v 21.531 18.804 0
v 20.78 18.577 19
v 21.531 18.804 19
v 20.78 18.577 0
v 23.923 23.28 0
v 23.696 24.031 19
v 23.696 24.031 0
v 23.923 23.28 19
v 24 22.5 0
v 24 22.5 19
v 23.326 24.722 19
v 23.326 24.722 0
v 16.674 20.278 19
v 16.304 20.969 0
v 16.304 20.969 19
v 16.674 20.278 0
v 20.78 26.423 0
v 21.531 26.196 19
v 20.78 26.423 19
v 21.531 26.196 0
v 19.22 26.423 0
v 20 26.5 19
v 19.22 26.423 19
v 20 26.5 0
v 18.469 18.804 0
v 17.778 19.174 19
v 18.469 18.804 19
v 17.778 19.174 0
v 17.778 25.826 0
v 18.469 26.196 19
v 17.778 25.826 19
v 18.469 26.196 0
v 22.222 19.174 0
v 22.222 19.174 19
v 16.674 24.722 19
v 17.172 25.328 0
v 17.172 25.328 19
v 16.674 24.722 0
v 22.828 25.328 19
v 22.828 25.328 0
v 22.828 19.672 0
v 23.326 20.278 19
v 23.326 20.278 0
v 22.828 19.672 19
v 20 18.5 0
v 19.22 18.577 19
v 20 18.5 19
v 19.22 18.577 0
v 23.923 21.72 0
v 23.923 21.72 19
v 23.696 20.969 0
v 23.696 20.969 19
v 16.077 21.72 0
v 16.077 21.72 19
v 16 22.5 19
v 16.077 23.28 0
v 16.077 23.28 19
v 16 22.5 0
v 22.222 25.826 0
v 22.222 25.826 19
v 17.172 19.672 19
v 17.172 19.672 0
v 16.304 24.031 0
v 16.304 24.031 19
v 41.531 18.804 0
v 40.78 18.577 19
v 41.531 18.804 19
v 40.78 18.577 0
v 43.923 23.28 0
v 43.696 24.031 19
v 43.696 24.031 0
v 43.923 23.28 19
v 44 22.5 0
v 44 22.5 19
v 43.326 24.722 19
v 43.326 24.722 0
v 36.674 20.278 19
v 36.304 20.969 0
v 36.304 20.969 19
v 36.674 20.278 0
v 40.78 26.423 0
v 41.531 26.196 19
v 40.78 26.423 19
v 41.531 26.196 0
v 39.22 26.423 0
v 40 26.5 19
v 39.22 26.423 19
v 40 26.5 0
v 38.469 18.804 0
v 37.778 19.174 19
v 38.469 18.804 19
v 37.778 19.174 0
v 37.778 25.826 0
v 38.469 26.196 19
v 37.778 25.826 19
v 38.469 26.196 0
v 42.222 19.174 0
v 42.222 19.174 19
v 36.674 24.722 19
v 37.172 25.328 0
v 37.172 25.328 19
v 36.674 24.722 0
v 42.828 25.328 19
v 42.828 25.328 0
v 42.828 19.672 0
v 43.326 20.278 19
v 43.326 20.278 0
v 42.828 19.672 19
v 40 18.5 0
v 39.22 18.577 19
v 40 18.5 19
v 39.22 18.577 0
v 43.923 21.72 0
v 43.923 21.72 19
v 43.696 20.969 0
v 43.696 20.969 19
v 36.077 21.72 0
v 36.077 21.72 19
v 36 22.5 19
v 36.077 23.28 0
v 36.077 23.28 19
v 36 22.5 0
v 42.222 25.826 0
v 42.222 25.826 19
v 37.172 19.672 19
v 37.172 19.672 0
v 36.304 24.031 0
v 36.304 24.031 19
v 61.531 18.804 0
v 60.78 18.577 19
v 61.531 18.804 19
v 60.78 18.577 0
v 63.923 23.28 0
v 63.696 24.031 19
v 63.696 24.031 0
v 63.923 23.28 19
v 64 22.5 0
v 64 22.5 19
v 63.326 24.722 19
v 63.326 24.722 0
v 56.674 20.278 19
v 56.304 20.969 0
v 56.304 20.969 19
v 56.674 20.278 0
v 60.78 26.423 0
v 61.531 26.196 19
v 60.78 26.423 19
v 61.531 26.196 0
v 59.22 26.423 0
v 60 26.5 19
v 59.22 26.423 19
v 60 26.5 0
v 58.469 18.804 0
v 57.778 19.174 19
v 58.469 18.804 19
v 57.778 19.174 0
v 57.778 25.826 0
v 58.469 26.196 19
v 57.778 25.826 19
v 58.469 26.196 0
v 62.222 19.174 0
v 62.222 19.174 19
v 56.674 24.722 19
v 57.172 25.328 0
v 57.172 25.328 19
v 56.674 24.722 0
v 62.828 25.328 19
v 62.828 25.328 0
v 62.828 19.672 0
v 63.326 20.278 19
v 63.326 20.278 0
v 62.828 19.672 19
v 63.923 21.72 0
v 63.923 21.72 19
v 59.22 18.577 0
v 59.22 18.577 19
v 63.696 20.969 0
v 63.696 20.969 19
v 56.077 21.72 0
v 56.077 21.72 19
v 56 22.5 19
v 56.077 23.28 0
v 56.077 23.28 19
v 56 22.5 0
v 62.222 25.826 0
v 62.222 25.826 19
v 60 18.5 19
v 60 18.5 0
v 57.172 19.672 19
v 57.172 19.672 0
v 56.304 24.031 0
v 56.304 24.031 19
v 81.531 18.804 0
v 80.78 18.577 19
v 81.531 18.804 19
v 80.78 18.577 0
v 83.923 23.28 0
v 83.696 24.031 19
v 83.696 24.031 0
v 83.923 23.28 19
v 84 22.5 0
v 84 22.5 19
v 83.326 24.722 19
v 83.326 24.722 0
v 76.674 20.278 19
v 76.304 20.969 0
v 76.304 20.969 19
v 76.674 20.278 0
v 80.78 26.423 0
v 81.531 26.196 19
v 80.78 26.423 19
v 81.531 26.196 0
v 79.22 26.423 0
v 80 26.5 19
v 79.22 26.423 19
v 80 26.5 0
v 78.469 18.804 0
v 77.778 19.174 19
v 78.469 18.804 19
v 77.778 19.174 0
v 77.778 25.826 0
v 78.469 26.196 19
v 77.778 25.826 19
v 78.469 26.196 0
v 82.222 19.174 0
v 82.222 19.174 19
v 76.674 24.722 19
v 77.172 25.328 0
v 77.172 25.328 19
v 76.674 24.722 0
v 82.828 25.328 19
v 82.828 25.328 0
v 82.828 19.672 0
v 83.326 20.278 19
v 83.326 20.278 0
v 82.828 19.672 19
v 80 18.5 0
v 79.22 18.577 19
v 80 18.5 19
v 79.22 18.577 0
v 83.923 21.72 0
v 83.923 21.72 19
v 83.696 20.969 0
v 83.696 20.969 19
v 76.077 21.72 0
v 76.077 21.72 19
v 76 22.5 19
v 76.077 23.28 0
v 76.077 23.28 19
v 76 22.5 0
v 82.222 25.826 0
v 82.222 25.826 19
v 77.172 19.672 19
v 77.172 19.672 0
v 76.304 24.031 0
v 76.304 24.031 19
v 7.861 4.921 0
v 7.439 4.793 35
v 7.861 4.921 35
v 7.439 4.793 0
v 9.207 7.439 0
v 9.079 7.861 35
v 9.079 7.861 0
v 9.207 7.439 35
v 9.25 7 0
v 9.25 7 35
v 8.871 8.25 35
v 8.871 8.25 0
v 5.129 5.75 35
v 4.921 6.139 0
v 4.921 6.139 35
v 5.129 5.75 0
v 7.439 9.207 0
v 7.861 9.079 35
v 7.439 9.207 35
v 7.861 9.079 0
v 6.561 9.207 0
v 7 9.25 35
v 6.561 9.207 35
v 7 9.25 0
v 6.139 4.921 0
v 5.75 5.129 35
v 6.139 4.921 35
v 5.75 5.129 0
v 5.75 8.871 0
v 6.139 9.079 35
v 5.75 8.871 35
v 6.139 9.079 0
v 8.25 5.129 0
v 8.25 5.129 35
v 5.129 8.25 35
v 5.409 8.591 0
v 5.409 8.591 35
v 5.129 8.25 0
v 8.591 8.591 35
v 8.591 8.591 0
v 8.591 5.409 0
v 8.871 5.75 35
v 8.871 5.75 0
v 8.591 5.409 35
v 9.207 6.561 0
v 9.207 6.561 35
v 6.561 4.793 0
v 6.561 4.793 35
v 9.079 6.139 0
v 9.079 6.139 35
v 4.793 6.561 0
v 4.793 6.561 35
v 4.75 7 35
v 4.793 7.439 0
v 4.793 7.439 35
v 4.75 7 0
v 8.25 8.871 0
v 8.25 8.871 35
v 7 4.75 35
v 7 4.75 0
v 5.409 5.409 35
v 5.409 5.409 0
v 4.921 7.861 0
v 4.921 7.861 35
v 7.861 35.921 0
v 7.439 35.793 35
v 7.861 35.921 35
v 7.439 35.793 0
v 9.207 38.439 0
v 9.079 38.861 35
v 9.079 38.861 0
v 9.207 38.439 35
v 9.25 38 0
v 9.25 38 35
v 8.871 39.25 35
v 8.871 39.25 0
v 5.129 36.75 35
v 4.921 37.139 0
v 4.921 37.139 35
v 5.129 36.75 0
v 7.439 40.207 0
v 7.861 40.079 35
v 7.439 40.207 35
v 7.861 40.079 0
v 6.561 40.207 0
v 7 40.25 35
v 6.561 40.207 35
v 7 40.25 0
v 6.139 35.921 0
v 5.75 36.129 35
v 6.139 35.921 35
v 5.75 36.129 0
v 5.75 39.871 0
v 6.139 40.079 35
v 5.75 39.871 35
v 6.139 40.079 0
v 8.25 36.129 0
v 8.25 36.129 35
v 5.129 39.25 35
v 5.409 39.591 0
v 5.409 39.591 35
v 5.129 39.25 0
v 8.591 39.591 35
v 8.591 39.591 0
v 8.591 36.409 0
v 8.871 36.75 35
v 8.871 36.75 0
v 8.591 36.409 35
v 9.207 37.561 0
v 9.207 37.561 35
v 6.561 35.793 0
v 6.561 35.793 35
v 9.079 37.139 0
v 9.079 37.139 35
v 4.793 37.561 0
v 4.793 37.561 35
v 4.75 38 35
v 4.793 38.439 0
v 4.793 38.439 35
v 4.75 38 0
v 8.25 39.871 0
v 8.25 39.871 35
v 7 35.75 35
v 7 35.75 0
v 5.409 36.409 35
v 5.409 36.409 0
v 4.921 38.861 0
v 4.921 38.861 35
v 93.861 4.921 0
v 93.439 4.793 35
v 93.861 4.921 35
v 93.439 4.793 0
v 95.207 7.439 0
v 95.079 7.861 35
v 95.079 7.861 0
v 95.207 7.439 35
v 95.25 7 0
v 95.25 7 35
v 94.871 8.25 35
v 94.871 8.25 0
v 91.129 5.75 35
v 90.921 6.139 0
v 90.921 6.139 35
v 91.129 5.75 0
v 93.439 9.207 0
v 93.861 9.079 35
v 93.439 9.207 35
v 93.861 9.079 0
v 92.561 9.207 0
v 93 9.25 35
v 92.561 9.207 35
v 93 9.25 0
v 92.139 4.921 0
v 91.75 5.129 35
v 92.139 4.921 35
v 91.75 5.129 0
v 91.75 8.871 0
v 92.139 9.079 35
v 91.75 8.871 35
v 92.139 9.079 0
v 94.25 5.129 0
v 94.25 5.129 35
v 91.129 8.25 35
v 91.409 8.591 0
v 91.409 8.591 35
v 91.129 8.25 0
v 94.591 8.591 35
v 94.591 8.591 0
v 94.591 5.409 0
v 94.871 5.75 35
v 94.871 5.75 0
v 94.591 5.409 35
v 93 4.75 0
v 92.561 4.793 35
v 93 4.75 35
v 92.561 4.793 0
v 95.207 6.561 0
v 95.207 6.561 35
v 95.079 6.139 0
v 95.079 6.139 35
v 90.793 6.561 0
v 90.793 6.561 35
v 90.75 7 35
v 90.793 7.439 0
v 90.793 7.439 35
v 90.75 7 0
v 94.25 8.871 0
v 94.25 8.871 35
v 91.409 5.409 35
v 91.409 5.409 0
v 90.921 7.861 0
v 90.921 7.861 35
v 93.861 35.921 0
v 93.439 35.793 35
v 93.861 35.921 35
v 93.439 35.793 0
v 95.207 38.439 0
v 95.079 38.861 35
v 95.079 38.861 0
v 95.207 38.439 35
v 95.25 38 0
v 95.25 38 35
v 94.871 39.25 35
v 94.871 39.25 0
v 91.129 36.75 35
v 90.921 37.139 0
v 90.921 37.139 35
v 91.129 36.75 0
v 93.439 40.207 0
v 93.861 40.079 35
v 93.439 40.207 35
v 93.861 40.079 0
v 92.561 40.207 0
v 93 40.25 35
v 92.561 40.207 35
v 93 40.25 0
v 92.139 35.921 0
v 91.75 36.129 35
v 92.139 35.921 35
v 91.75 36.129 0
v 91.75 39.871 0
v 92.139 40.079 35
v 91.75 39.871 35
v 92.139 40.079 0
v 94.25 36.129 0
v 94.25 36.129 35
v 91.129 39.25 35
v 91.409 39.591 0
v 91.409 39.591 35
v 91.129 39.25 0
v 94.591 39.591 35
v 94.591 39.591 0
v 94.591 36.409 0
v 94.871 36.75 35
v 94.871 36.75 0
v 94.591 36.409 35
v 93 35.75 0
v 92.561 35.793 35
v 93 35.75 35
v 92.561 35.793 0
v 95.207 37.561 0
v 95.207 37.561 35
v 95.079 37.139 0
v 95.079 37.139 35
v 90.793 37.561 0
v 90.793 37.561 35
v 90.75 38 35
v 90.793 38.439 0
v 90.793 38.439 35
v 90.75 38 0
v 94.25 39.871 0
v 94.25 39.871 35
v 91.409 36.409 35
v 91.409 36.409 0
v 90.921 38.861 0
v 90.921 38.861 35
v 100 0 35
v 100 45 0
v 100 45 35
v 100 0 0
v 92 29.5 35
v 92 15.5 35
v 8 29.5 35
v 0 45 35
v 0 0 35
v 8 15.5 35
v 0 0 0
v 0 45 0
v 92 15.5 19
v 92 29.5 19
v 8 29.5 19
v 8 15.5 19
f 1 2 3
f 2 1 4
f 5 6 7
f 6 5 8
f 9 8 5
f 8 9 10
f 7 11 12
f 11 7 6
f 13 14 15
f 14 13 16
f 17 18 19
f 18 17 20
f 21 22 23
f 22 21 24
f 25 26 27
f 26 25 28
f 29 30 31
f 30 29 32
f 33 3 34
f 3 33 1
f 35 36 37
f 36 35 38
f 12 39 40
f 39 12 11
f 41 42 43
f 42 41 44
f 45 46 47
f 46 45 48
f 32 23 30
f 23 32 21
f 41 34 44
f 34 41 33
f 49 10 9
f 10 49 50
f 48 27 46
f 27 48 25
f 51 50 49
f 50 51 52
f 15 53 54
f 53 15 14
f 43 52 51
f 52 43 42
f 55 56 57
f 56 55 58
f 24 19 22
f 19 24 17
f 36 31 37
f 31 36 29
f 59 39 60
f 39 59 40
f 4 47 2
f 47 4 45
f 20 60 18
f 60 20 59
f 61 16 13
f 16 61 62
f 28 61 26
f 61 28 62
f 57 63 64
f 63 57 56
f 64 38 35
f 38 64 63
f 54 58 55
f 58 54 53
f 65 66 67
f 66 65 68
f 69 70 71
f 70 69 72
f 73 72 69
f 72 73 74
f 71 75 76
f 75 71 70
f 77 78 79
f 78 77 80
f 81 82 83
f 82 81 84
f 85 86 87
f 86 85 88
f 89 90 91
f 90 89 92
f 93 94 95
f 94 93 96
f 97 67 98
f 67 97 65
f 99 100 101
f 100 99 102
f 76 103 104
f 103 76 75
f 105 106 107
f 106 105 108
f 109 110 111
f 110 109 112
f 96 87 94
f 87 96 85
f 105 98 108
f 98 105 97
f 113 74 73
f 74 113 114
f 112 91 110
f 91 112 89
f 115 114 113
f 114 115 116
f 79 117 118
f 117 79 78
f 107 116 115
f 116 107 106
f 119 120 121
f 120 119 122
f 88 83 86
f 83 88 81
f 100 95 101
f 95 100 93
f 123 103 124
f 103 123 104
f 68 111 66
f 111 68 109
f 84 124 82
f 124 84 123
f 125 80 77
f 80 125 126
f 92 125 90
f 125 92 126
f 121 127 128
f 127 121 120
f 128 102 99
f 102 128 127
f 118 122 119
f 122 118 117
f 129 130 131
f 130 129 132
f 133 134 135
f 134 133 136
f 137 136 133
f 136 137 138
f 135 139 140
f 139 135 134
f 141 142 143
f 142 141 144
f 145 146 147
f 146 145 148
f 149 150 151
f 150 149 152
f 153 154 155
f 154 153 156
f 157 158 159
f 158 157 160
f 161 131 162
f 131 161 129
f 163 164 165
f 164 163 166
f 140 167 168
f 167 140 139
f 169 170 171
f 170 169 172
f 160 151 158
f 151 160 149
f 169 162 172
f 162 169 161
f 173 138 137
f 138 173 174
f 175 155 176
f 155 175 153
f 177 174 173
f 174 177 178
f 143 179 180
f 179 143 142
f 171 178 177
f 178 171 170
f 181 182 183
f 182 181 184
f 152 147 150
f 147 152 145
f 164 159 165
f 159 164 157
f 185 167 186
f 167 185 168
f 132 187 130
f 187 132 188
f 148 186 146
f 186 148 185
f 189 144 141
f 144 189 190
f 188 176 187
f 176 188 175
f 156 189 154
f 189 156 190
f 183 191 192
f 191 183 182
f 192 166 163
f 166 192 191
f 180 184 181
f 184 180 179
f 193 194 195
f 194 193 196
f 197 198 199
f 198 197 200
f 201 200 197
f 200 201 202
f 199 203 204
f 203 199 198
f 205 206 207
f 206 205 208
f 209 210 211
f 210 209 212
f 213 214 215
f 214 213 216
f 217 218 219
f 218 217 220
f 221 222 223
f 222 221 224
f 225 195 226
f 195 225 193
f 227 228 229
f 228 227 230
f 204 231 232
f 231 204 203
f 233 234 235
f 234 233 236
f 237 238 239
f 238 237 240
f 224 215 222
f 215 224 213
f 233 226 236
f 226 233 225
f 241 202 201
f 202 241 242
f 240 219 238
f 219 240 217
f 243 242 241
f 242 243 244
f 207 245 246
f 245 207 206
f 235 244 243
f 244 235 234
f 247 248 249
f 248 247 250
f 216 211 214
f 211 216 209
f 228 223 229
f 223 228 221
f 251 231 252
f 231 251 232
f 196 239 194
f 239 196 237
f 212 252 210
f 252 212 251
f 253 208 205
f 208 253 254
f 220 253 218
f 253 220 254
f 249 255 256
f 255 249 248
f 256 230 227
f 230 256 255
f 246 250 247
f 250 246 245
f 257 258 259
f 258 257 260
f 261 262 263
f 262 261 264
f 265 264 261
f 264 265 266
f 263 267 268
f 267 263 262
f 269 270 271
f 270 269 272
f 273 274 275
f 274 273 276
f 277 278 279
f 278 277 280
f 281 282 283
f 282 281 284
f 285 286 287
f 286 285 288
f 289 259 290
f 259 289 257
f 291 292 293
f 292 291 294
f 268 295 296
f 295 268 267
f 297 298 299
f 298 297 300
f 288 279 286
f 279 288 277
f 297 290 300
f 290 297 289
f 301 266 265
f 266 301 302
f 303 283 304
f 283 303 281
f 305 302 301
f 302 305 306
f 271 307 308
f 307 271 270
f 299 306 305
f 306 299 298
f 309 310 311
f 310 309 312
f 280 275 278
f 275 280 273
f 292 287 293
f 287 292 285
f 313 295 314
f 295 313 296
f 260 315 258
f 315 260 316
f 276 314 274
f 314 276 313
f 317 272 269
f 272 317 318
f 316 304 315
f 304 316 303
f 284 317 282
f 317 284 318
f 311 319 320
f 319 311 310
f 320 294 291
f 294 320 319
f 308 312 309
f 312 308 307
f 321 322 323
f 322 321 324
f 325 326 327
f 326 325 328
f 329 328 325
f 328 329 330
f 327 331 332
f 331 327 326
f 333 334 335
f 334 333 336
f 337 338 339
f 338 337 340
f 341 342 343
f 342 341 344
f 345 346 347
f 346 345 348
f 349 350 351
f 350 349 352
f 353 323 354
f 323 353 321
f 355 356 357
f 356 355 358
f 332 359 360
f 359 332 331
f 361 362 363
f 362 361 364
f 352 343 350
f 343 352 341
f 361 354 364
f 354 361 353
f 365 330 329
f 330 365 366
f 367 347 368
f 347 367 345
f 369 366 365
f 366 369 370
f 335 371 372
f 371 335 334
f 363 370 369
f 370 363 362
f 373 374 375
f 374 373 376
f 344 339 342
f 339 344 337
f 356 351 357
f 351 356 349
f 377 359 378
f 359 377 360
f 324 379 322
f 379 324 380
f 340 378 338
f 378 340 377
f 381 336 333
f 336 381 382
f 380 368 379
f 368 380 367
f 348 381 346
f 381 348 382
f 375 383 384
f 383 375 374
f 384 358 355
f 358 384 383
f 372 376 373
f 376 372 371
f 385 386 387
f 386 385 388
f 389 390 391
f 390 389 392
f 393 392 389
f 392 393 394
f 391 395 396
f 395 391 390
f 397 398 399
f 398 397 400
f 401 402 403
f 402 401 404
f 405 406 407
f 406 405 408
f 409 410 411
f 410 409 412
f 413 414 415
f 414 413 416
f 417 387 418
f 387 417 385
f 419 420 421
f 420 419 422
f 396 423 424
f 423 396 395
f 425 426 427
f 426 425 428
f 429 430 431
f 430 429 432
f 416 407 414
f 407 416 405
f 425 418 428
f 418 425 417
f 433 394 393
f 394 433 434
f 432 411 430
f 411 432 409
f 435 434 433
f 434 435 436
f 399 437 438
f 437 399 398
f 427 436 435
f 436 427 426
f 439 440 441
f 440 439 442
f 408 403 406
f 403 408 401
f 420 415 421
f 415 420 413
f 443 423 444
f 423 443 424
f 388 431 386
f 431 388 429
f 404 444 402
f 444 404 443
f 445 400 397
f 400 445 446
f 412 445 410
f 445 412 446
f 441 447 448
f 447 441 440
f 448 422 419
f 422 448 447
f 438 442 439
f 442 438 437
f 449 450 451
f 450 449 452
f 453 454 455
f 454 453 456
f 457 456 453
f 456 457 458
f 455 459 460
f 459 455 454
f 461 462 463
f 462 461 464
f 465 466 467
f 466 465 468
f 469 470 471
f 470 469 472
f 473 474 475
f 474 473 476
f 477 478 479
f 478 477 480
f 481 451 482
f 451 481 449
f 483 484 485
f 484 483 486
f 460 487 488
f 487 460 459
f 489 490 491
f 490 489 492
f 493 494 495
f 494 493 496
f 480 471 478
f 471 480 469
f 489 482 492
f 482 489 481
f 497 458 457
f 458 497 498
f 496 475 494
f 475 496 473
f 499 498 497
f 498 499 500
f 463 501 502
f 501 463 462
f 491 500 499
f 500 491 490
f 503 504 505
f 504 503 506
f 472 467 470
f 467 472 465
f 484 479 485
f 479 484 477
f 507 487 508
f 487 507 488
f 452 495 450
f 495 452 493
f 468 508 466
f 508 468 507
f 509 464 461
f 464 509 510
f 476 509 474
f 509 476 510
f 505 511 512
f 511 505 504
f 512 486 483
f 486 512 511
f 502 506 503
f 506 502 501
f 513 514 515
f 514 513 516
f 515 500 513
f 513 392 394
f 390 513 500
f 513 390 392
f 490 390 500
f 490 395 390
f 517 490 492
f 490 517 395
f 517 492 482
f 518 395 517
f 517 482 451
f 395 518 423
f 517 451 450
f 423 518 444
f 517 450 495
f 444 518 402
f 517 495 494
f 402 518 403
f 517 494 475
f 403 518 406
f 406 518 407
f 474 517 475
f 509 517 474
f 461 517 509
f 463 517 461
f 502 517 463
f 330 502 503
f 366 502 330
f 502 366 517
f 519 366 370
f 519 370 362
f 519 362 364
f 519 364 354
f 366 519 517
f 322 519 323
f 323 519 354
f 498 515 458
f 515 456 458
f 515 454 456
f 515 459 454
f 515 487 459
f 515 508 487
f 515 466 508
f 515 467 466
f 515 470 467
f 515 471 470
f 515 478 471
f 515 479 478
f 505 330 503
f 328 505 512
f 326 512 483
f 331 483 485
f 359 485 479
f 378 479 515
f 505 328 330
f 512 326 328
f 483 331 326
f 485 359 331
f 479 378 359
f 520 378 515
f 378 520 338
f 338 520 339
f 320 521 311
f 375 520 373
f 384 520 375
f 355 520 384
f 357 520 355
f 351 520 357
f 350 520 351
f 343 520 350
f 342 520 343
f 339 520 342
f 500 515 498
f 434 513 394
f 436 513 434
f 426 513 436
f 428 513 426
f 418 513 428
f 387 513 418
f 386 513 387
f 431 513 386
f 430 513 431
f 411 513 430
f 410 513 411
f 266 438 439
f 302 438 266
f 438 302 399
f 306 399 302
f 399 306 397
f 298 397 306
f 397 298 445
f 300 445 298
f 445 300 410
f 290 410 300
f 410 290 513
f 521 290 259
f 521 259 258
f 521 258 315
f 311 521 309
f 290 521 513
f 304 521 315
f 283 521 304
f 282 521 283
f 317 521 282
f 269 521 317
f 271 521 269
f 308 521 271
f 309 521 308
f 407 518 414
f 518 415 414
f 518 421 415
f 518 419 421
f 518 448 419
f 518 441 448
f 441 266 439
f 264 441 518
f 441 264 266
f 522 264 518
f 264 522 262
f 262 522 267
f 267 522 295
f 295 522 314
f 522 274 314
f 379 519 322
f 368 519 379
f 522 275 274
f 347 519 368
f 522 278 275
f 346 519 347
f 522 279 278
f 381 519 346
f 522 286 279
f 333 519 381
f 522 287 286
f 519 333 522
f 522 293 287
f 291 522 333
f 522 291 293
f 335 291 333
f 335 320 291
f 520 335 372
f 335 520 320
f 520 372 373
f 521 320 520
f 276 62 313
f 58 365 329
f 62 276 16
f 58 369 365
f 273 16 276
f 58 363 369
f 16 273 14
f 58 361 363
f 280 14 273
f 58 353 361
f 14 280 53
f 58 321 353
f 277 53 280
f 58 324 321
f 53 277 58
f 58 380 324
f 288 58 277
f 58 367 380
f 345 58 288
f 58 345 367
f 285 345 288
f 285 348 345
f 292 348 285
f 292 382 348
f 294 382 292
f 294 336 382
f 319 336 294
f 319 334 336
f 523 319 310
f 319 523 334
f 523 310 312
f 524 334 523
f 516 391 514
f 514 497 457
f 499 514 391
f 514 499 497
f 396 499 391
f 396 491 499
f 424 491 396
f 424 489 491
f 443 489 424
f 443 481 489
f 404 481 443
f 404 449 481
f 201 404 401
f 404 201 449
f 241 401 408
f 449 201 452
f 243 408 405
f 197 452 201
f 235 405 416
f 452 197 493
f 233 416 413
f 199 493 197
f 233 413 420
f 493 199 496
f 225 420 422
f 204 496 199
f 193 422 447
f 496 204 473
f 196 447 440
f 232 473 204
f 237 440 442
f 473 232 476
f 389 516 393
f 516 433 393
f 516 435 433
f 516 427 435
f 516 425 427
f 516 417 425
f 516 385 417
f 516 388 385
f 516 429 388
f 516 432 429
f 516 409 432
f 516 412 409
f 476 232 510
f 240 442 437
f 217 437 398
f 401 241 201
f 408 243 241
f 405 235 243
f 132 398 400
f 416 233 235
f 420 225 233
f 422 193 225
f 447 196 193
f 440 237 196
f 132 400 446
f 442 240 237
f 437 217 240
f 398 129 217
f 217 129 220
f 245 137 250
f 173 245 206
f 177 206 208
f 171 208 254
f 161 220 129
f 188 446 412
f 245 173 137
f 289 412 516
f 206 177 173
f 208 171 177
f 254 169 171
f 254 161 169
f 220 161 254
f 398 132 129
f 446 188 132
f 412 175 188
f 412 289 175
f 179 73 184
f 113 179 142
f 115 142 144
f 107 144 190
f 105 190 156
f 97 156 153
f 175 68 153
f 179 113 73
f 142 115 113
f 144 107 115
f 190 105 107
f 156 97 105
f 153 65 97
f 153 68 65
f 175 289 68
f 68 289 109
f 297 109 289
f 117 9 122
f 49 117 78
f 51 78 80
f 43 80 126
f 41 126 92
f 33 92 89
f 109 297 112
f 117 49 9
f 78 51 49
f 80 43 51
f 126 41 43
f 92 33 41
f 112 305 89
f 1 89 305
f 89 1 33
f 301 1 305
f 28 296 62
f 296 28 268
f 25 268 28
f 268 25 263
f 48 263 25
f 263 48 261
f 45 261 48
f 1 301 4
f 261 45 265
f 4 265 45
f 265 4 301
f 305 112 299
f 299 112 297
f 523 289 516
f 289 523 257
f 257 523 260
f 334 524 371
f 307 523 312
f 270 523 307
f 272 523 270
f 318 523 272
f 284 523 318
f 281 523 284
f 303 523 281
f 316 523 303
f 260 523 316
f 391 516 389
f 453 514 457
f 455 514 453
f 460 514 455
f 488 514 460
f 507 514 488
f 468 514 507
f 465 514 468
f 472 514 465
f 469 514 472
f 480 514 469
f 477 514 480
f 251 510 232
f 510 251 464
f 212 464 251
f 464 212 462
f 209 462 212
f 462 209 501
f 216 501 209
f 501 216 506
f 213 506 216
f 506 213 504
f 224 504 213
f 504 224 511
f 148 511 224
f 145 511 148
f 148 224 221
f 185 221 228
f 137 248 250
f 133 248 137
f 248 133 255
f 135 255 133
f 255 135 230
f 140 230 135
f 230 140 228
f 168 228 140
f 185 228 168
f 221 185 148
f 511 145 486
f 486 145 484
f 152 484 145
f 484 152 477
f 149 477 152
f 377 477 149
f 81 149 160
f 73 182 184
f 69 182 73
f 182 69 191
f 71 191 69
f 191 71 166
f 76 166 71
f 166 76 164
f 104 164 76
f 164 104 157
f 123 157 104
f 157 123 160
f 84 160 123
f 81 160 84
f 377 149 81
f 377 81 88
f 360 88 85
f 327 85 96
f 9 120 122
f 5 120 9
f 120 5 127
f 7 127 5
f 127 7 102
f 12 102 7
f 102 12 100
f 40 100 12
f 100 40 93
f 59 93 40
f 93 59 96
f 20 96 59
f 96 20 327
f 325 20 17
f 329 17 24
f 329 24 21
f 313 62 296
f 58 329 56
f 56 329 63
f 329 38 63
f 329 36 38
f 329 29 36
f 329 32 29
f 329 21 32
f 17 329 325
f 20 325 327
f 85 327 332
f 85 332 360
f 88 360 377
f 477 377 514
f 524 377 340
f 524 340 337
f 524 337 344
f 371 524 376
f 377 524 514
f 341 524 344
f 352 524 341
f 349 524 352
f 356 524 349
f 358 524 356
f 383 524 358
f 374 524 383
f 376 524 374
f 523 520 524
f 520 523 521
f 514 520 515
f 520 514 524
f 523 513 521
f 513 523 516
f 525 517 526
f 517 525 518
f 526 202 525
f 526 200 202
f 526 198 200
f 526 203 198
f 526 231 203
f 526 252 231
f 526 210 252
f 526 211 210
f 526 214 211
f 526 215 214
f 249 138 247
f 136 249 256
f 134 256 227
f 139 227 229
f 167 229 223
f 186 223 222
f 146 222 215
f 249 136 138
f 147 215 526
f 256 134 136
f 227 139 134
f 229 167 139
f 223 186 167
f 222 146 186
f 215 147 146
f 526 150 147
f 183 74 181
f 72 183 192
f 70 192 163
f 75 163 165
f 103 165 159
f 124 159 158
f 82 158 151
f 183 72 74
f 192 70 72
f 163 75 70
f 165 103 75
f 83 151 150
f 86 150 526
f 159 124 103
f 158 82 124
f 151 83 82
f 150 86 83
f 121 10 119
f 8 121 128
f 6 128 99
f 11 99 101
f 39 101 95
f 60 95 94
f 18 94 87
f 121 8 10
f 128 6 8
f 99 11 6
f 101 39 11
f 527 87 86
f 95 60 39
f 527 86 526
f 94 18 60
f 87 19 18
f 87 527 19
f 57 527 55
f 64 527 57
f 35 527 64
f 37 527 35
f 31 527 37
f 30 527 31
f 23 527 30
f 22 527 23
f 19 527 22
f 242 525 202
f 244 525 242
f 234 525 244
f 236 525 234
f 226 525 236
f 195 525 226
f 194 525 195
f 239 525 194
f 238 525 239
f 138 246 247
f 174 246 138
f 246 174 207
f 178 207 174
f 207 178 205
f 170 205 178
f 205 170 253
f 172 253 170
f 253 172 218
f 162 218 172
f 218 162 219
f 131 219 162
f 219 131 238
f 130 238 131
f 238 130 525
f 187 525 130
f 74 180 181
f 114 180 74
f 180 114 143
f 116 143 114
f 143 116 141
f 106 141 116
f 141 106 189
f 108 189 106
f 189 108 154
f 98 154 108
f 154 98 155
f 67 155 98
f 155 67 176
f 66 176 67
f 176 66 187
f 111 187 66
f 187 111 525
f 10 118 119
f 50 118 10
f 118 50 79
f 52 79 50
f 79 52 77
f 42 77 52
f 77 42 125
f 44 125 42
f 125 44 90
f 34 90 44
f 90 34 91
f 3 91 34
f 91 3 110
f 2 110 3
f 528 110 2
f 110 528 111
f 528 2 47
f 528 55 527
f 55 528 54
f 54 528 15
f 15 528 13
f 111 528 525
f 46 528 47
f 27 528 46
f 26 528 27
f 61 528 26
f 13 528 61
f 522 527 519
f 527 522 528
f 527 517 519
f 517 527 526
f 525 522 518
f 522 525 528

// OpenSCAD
$fn = 32;

// ----------------------------------------------------------------------
// Manifold block: gallery_top manifold
// ----------------------------------------------------------------------

// --- parameters (mm) ---
block_l = 100;            // block length, X
block_w = 45;             // block width, Y
block_h = 35;             // block height, Z
port_d = 8;               // port bore diameter
port_pitch = 20;          // port pitch along X
gallery_d = 14;           // top gallery width, Y
gallery_depth = 16;       // gallery pocket depth
wall_p = 8;               // gallery end wall thickness, X
mnt_d = 4.5;              // mounting hole diameter
mnt_in = 7;               // mounting hole inset from the edges

n_ports = 4;  // ports in the row
port_x0 = (block_l - (n_ports - 1) * port_pitch) / 2;  // first port X

difference() {
  cube([block_l, block_w, block_h]);
  for (i = [0 : n_ports - 1])
    translate([port_x0 + i * port_pitch, block_w / 2, -1])
      cylinder(h = block_h + 2, d = port_d);
  translate([wall_p, block_w / 2 - gallery_d / 2, block_h - gallery_depth])
    cube([block_l - 2 * wall_p, gallery_d, gallery_depth + 1]);
  for (cx = [mnt_in, block_l - mnt_in])
    for (cy = [mnt_in, block_w - mnt_in])
      translate([cx, cy, -1]) cylinder(h = block_h + 2, d = mnt_d);
}
